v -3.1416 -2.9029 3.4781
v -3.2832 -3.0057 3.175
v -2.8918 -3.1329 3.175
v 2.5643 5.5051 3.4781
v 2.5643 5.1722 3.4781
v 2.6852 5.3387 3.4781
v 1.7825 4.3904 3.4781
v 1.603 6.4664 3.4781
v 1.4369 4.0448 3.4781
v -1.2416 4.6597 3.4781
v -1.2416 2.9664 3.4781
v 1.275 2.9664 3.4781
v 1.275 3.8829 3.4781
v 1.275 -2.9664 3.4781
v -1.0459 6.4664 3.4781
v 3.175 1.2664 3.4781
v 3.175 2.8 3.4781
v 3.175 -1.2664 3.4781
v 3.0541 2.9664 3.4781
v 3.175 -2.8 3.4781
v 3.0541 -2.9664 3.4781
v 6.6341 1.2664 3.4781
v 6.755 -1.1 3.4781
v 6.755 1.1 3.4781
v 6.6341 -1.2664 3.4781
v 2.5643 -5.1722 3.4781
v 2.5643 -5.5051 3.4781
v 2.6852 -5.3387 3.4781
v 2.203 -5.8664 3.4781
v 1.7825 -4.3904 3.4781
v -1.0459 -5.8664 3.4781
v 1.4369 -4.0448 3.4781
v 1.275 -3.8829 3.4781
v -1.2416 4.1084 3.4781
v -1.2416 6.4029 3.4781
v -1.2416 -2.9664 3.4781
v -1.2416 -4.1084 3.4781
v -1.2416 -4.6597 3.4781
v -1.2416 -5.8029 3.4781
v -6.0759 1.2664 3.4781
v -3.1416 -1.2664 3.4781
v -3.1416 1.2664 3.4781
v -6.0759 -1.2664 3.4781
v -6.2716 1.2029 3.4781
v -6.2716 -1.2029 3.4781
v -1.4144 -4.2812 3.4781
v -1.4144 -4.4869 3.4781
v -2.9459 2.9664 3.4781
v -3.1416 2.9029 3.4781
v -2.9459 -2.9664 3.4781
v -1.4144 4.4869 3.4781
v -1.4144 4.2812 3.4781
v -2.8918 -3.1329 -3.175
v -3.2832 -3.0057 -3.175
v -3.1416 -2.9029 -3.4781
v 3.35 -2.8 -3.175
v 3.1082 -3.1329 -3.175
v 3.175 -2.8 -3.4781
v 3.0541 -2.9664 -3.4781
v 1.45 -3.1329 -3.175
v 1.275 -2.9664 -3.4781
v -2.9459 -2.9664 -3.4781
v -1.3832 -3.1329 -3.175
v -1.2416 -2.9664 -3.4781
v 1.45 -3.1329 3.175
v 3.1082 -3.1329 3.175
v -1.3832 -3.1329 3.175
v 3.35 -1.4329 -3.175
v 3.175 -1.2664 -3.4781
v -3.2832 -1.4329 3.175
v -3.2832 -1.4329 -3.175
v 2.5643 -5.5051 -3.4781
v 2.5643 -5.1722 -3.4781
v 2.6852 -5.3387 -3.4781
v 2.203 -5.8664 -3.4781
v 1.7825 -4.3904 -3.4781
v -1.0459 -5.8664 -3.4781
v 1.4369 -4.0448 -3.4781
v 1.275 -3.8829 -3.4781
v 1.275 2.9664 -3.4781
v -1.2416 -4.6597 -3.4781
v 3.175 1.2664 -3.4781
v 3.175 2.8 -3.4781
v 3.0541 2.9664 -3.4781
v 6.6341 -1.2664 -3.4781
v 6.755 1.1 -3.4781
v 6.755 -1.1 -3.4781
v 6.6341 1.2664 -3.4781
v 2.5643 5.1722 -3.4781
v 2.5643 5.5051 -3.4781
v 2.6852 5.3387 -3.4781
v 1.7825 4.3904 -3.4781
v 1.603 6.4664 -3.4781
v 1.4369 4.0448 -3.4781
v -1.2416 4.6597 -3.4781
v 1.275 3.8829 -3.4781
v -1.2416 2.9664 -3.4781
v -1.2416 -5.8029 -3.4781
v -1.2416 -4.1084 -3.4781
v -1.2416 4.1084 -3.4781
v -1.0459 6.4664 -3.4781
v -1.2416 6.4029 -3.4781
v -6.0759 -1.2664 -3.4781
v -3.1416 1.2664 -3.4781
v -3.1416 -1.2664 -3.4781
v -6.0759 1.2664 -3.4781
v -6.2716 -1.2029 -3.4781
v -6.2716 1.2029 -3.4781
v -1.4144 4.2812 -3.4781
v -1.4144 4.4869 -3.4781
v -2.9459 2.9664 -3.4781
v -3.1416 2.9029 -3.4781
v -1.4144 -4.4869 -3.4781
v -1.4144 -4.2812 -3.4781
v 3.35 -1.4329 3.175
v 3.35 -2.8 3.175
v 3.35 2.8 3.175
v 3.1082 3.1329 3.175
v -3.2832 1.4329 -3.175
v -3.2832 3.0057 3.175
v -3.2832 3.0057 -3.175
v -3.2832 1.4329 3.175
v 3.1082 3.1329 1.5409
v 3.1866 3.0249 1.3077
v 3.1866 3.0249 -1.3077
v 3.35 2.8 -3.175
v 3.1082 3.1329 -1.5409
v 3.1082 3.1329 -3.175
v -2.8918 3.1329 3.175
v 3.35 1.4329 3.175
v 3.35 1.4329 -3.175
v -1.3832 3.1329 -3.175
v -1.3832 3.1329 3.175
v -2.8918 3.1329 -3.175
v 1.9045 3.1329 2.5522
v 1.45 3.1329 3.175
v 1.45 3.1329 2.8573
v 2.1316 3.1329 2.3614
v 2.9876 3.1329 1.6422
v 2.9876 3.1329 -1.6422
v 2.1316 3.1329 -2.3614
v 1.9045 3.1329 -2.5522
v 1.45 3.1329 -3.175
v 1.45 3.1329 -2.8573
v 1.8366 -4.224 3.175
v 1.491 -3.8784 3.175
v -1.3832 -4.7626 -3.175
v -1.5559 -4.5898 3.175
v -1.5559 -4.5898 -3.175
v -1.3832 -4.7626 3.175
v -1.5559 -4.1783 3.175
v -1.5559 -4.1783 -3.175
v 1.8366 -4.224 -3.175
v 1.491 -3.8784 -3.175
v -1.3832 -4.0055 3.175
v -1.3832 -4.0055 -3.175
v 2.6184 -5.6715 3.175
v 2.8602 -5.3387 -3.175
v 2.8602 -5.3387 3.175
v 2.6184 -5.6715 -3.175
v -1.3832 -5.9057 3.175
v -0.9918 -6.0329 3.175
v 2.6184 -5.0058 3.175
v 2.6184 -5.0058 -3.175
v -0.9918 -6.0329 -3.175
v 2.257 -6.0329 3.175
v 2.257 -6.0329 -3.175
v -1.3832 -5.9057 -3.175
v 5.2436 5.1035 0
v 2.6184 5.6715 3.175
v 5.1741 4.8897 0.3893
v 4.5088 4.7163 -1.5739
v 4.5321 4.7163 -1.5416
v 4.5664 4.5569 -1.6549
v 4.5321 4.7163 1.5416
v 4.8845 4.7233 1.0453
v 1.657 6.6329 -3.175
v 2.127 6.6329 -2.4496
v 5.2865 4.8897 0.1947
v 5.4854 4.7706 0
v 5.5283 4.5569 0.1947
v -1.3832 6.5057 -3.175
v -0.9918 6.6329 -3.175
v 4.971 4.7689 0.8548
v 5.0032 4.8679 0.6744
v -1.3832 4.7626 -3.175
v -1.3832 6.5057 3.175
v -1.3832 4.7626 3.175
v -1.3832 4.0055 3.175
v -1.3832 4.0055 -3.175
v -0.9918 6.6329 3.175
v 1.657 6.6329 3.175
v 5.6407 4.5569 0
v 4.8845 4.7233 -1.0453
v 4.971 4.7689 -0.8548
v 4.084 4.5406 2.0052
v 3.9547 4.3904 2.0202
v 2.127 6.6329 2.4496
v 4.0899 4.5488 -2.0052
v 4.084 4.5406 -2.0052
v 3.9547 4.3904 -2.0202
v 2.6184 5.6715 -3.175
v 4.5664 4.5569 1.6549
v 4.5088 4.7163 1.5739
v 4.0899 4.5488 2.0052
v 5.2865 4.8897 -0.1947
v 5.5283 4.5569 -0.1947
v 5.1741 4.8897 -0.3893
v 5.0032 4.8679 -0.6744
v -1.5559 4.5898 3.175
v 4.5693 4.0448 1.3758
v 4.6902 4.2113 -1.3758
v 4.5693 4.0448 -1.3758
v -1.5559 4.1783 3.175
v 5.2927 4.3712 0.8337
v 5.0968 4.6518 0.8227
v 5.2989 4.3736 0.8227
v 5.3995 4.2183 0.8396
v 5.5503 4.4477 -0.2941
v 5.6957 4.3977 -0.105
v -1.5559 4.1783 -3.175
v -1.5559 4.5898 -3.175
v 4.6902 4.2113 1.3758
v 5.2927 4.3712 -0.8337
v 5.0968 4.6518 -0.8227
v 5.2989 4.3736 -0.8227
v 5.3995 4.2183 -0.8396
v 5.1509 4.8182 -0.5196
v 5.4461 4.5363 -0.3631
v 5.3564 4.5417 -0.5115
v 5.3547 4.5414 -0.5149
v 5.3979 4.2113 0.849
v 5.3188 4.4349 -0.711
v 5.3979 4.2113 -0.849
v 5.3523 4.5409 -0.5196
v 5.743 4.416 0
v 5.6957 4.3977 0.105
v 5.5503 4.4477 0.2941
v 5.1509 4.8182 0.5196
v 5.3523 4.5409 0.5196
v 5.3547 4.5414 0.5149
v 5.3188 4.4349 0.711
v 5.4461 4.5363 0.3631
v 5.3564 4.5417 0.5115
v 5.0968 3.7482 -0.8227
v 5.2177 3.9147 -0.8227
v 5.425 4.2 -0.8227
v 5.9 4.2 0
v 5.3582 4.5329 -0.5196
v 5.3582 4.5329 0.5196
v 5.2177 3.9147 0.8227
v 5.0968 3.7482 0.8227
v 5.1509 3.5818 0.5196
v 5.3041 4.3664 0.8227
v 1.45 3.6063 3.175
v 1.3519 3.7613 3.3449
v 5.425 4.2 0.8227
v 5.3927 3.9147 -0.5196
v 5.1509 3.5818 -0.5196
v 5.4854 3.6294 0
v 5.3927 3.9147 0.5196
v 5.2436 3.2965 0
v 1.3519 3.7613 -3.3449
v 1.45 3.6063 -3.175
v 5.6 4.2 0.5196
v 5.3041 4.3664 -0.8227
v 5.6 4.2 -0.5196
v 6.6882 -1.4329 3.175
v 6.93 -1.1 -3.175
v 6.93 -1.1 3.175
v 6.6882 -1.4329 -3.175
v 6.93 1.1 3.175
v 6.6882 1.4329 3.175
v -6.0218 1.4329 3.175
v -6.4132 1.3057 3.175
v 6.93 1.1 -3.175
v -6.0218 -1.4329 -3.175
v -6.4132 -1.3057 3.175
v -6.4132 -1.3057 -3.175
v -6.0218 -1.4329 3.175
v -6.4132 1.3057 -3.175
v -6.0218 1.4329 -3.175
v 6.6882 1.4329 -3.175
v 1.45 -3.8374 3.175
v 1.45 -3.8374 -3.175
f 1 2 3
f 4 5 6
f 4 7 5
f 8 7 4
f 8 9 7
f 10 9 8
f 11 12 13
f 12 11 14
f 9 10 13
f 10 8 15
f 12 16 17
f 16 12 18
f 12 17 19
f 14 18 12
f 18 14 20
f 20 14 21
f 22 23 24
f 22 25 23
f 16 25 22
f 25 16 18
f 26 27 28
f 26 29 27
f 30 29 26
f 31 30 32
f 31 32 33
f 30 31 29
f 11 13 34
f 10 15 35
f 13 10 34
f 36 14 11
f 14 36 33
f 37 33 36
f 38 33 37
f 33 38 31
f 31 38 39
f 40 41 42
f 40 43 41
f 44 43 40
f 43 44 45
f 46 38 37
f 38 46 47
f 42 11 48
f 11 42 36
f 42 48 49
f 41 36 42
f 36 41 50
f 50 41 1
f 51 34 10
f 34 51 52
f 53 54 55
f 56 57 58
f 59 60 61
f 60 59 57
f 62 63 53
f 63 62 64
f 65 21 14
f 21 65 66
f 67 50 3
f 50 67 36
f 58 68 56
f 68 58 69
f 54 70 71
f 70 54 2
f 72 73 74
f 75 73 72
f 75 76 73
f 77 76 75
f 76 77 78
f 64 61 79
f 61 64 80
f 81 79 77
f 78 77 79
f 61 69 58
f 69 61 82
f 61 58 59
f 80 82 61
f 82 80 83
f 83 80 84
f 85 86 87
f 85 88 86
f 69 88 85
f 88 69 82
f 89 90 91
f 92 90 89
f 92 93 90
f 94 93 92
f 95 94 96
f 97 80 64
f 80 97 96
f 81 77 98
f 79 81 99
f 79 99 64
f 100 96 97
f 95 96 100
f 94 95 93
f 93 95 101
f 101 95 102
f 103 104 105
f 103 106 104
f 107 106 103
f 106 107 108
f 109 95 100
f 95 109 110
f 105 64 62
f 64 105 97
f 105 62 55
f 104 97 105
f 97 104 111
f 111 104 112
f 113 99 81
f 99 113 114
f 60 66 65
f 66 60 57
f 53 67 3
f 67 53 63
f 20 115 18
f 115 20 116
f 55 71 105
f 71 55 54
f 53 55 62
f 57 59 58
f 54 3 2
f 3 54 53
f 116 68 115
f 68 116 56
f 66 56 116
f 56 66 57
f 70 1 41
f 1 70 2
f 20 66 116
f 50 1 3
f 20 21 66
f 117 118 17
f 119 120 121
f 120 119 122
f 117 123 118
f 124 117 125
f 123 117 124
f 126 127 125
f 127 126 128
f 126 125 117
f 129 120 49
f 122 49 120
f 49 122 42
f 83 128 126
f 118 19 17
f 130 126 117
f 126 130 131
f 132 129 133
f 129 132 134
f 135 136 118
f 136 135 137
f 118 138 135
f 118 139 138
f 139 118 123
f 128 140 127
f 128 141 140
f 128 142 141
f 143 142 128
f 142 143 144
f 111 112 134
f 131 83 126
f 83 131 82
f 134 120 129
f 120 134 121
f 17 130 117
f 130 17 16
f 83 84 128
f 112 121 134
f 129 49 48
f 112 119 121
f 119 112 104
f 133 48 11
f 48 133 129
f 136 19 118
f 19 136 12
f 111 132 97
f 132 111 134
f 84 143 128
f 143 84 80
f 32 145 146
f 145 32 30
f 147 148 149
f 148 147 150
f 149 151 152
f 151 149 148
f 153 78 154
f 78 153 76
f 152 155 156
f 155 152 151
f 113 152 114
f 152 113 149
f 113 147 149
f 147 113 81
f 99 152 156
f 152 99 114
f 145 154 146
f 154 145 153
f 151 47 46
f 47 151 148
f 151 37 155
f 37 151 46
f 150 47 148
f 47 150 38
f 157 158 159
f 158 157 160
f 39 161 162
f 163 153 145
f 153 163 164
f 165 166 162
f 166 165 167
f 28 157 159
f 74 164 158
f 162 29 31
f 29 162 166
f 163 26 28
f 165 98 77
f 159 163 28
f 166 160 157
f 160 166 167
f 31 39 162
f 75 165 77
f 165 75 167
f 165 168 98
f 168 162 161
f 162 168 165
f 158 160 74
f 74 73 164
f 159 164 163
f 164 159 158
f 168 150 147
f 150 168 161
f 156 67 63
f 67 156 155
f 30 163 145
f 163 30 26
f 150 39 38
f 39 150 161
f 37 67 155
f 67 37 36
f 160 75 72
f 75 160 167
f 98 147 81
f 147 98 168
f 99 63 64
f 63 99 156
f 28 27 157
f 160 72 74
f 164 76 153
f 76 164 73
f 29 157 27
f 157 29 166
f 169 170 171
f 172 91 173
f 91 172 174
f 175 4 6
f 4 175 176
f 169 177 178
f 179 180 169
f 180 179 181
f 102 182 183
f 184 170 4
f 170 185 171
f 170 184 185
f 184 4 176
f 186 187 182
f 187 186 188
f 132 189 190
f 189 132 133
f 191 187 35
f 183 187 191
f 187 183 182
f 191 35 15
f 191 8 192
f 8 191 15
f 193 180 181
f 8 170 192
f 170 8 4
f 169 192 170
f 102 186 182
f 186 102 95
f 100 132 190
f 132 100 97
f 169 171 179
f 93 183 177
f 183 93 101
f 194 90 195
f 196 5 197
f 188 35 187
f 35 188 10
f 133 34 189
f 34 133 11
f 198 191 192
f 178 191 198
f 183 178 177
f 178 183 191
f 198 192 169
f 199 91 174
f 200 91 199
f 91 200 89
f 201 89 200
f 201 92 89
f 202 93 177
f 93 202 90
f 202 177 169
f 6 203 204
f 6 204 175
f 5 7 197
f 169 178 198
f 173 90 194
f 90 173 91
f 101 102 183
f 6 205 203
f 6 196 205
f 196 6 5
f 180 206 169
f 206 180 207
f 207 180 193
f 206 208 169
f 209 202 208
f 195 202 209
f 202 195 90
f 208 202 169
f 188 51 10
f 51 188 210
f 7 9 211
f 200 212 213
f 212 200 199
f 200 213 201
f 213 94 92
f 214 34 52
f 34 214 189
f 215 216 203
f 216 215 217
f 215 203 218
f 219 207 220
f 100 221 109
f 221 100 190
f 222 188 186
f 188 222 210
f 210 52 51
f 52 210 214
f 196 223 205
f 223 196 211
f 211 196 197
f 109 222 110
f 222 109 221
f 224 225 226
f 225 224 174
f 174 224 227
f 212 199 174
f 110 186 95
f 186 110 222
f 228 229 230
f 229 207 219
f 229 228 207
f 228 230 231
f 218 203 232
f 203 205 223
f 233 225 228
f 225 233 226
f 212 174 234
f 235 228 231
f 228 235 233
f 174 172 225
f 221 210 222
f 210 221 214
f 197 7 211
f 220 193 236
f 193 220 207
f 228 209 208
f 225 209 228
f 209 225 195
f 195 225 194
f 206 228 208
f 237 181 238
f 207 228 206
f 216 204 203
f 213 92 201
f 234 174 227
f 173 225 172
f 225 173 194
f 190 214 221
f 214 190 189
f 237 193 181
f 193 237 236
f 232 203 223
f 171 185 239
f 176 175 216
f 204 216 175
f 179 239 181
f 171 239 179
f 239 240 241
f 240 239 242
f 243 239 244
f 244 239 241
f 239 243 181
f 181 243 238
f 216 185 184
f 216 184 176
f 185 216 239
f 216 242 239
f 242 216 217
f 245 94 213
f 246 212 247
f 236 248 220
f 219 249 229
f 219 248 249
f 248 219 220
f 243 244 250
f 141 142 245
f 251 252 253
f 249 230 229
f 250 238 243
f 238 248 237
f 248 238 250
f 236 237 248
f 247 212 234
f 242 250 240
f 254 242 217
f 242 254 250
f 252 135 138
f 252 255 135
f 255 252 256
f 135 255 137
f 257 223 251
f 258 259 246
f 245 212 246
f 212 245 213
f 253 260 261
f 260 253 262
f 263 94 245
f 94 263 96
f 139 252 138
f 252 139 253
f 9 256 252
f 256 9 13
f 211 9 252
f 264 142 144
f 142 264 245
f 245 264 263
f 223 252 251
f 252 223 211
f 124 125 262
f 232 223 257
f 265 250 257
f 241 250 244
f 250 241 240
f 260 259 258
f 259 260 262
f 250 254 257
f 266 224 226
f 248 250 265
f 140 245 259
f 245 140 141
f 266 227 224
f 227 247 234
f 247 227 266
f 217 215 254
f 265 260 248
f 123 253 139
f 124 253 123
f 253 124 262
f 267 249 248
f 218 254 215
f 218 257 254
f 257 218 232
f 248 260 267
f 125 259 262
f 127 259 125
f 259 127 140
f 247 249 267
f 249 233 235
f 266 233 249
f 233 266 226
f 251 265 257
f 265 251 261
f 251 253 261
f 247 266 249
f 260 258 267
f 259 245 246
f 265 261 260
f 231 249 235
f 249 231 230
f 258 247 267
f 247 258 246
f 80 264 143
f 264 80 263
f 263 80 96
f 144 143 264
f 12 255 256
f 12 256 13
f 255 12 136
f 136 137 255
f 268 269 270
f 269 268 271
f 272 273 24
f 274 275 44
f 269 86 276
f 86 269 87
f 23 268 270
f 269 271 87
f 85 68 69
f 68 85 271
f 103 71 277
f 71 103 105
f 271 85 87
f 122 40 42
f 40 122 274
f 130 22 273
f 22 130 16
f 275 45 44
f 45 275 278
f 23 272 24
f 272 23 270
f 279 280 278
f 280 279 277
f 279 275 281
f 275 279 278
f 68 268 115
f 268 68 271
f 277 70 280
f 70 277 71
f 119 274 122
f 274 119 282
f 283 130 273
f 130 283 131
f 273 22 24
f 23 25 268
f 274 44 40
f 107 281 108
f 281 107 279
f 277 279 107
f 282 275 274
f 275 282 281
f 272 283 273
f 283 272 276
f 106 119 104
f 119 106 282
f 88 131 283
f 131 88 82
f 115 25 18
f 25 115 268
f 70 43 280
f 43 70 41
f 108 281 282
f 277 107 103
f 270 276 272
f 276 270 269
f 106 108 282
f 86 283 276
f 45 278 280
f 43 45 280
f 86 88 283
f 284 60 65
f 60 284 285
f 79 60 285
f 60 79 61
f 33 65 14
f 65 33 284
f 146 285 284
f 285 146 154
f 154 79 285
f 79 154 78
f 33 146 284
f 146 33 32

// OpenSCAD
// Parameters
bbox_X = 13.16; //[6.58:26.32:0.01]
bbox_Y = 12; //[6:24:0.01]
bbox_Z = 6.35; //[3.175:12.7:0.01]
hub_X = 6; //[3:12:0.01]
hub_Y = 5.6; //[2.8:11.2:0.01]
hub_Z = 6.35; //[3.175:12.7:0.01]
arm_thk_Z = 6.35; //[3.175:12.7:0.01]
arm_W = 2.2; //[1.1:4.4:0.01]
arm_L_cardinal = 3.58; //[1.79:7.16:0.01]
arm_W_diag = 2; //[1:4:0.01]
arm_L_diag = 2.55; //[1.275:5.1:0.01]
fillet_R_arm_end = 0.6; //[0.3:1.2:0.01]
fillet_R_hub_corner = 0.5; //[0.25:1:0.01]
overlap = 0.8; //[0.2:1.6:0.01]
blend_R = 0.35; //[0.15:0.8:0.01]
asym_trim_X = 0.9; //[0.3:1.8:0.01]
asym_trim_Y = 0.6; //[0.2:1.2:0.01]

// Base shapes
module central_hub_prism() {
  translate([0, 0, 0])
    cube([hub_X, hub_Y, hub_Z], center=true);
}

module radial_arm_east() {
  translate([hub_X/2 + (arm_L_cardinal + overlap)/2 - overlap, 0, 0])
    cube([arm_L_cardinal + overlap, arm_W, arm_thk_Z], center=true);
}

module radial_arm_west() {
  translate([-(hub_X/2 + (arm_L_cardinal + overlap)/2 - overlap), 0, 0])
    cube([arm_L_cardinal + overlap, arm_W, arm_thk_Z], center=true);
}

module radial_arm_north() {
  translate([0, hub_Y/2 + (arm_L_cardinal + overlap)/2 - overlap, 0])
    cube([arm_W, arm_L_cardinal + overlap, arm_thk_Z], center=true);
}

module radial_arm_south() {
  translate([0, -(hub_Y/2 + (arm_L_cardinal + overlap)/2 - overlap), 0])
    cube([arm_W, arm_L_cardinal + overlap, arm_thk_Z], center=true);
}

module radial_arm_ne_raw() {
  translate([hub_X/2 + (arm_L_diag + overlap)/2 - overlap, hub_Y/2 + arm_W_diag/2 - overlap, 0])
    cube([arm_L_diag + overlap, arm_W_diag, arm_thk_Z], center=true);
}

module radial_arm_nw_raw() {
  translate([-(hub_X/2 + (arm_L_diag + overlap)/2 - overlap), hub_Y/2 + arm_W_diag/2 - overlap, 0])
    cube([arm_L_diag + overlap, arm_W_diag, arm_thk_Z], center=true);
}

module radial_arm_se_raw() {
  translate([hub_X/2 + (arm_L_diag + overlap)/2 - overlap, -(hub_Y/2 + arm_W_diag/2 - overlap), 0])
    cube([arm_L_diag + overlap, arm_W_diag, arm_thk_Z], center=true);
}

module radial_arm_sw_raw() {
  translate([-(hub_X/2 + (arm_L_diag + overlap)/2 - overlap), -(hub_Y/2 + arm_W_diag/2 - overlap), 0])
    cube([arm_L_diag + overlap, arm_W_diag, arm_thk_Z], center=true);
}

module arm_end_rounding_sphere_e() {
  translate([hub_X/2 + arm_L_cardinal - fillet_R_arm_end, 0, 0])
    sphere(r=fillet_R_arm_end);
}

module arm_end_rounding_sphere_n() {
  translate([0, hub_Y/2 + arm_L_cardinal - fillet_R_arm_end, 0])
    sphere(r=fillet_R_arm_end);
}

module arm_end_rounding_sphere_ne() {
  translate([hub_X/2 + arm_L_diag - fillet_R_arm_end, hub_Y/2 + arm_W_diag - fillet_R_arm_end, 0])
    sphere(r=fillet_R_arm_end);
}

module hub_corner_rounding_sphere_ne() {
  translate([hub_X/2 - fillet_R_hub_corner, hub_Y/2 - fillet_R_hub_corner, 0])
    sphere(r=fillet_R_hub_corner);
}

module hub_corner_rounding_sphere_nw() {
  translate([-(hub_X/2 - fillet_R_hub_corner), hub_Y/2 - fillet_R_hub_corner, 0])
    sphere(r=fillet_R_hub_corner);
}

module hub_corner_rounding_sphere_se() {
  translate([hub_X/2 - fillet_R_hub_corner, -(hub_Y/2 - fillet_R_hub_corner), 0])
    sphere(r=fillet_R_hub_corner);
}

module hub_corner_rounding_sphere_sw() {
  translate([-(hub_X/2 - fillet_R_hub_corner), -(hub_Y/2 - fillet_R_hub_corner), 0])
    sphere(r=fillet_R_hub_corner);
}

module selective_asymmetric_rounding_variation_trim_box() {
  translate([asym_trim_X/2, asym_trim_Y/2, 0])
    cube([bbox_X, bbox_Y, bbox_Z], center=true);
}

module subtle_molded_blend_transitions_sphere() {
  sphere(r=blend_R);
}

// Operations
module radial_arm_ne_rot() {
  rotate([0, 0, 45]) radial_arm_ne_raw();
}

module radial_arm_nw_rot() {
  rotate([0, 0, 135]) radial_arm_nw_raw();
}

module radial_arm_se_rot() {
  rotate([0, 0, -45]) radial_arm_se_raw();
}

module radial_arm_sw_rot() {
  rotate([0, 0, -135]) radial_arm_sw_raw();
}

module star_core_union() {
  union() {
    central_hub_prism();
    radial_arm_north();
    radial_arm_south();
    radial_arm_east();
    radial_arm_west();
    radial_arm_ne_rot();
    radial_arm_nw_rot();
    radial_arm_se_rot();
    radial_arm_sw_rot();
  }
}

module arm_end_rounding_hull_e() {
  hull() {
    radial_arm_east();
    arm_end_rounding_sphere_e();
  }
}

module arm_end_rounding_hull_n() {
  hull() {
    radial_arm_north();
    arm_end_rounding_sphere_n();
  }
}

module arm_end_rounding_hull_ne() {
  hull() {
    radial_arm_ne_rot();
    arm_end_rounding_sphere_ne();
  }
}

module hub_corner_rounding_hull_ne() {
  hull() {
    central_hub_prism();
    hub_corner_rounding_sphere_ne();
  }
}

module hub_corner_rounding_hull_nw() {
  hull() {
    central_hub_prism();
    hub_corner_rounding_sphere_nw();
  }
}

module hub_corner_rounding_hull_se() {
  hull() {
    central_hub_prism();
    hub_corner_rounding_sphere_se();
  }
}

module hub_corner_rounding_hull_sw() {
  hull() {
    central_hub_prism();
    hub_corner_rounding_sphere_sw();
  }
}

module arm_end_rounding() {
  union() {
    arm_end_rounding_hull_e();
    arm_end_rounding_hull_n();
    arm_end_rounding_hull_ne();
  }
}

module hub_corner_rounding() {
  union() {
    hub_corner_rounding_hull_ne();
    hub_corner_rounding_hull_nw();
    hub_corner_rounding_hull_se();
    hub_corner_rounding_hull_sw();
  }
}

module rounded_star_union() {
  union() {
    star_core_union();
    arm_end_rounding();
    hub_corner_rounding();
  }
}

module selective_asymmetric_rounding_variation() {
  intersection() {
    rounded_star_union();
    selective_asymmetric_rounding_variation_trim_box();
  }
}

module subtle_molded_blend_transitions() {
  minkowski() {
    selective_asymmetric_rounding_variation();
    subtle_molded_blend_transitions_sphere();
  }
}

// Final output
subtle_molded_blend_transitions();
